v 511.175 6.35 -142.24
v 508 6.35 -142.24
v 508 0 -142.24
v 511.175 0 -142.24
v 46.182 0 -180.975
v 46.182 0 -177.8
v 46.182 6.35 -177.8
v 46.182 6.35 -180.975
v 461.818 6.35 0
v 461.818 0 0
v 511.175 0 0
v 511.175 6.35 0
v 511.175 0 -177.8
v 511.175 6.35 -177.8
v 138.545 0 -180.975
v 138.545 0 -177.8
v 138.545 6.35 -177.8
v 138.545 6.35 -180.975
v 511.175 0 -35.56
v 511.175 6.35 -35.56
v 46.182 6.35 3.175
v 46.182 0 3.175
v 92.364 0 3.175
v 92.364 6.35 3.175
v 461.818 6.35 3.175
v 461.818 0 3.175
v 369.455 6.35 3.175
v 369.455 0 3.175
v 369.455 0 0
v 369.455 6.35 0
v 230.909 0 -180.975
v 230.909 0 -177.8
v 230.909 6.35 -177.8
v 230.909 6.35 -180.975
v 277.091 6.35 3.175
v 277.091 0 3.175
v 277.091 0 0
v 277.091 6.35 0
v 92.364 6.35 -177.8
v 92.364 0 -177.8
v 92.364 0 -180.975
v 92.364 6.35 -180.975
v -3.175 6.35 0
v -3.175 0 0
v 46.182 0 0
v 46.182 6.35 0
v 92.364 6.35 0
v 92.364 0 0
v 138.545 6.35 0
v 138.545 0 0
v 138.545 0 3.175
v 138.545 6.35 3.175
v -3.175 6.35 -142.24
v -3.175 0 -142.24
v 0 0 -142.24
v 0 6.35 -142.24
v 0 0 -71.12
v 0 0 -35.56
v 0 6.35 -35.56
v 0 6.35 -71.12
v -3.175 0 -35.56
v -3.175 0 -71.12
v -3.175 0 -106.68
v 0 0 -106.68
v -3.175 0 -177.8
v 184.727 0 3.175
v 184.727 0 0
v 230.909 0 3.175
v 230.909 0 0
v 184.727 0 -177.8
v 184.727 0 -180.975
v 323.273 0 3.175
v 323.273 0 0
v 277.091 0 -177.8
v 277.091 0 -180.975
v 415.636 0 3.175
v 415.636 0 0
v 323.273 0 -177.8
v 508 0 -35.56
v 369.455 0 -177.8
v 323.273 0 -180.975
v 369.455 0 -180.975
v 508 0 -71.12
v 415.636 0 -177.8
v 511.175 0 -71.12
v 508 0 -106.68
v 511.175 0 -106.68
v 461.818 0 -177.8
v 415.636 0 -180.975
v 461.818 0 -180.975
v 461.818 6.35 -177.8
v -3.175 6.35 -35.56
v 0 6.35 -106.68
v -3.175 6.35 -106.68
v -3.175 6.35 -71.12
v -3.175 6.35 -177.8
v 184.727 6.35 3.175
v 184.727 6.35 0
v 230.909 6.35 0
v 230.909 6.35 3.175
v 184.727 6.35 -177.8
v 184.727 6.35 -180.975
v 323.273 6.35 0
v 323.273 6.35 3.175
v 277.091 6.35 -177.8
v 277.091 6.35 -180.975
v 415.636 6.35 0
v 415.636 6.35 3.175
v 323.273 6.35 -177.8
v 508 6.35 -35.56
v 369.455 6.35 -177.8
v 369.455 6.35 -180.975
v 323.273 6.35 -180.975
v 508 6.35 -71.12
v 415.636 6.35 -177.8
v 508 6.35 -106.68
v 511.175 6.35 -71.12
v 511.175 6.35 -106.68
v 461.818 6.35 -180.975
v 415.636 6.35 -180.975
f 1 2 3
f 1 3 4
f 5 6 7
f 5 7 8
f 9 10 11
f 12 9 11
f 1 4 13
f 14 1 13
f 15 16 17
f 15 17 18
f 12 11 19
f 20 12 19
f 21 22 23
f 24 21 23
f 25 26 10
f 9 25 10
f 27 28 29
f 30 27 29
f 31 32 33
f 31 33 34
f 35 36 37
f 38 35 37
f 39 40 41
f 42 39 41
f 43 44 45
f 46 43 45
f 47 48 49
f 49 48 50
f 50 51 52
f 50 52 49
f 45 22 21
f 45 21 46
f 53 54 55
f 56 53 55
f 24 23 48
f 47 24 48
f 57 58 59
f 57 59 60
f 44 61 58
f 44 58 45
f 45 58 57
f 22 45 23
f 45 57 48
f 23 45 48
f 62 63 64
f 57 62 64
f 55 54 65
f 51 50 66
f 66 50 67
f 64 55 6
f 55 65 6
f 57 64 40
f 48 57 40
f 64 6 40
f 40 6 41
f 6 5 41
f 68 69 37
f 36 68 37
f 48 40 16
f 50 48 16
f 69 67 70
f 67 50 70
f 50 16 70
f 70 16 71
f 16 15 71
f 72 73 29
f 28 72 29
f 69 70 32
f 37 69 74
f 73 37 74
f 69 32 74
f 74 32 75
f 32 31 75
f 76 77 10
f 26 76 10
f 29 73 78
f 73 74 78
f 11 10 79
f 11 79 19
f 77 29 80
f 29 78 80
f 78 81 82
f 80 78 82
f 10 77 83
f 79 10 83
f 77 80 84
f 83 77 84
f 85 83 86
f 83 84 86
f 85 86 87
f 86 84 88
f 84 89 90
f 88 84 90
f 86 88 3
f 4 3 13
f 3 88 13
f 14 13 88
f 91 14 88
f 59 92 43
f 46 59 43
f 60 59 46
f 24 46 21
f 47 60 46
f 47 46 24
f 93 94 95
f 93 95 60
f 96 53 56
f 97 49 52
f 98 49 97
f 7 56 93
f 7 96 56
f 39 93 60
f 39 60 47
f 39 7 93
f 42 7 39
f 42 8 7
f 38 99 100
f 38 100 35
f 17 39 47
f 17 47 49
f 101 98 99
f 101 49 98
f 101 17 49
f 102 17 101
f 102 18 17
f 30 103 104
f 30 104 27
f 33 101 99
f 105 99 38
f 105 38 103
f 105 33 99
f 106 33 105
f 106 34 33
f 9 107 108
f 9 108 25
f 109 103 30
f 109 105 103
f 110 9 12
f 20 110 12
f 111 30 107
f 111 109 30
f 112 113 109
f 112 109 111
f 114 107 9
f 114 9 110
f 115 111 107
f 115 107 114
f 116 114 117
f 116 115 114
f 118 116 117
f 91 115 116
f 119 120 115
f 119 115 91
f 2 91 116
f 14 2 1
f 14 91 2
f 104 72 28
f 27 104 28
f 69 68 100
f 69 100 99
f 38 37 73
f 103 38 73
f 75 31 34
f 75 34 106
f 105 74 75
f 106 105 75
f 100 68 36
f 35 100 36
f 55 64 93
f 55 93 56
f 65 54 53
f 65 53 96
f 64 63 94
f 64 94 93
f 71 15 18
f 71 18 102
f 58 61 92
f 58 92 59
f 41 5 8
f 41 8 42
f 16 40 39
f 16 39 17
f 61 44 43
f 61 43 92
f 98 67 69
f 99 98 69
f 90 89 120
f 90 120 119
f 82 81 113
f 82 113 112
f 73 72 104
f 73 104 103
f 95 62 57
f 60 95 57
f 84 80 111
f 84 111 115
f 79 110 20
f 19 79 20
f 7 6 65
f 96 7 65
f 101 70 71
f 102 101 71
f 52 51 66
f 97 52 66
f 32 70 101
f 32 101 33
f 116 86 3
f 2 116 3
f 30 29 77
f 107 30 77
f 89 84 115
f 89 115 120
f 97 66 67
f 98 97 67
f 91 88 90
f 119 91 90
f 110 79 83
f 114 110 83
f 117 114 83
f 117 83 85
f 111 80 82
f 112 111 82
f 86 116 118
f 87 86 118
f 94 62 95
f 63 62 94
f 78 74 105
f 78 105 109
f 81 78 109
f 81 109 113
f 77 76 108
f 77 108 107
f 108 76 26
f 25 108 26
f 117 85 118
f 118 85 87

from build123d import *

# Parameters (mm, degrees)
SKETCH1_W           = 508
SKETCH1_H           = 177.8
SKETCH1_W_2         = 46.181818182
SKETCH1_H_2         = 3.175
SKETCH1_W_3         = 3.175
SKETCH1_H_3         = 35.56
BOSS_EXTRUDE1_DEPTH = 6.35


with BuildPart() as part:
    # Sketch1 → Boss-Extrude1 (new body)
    with BuildSketch(Plane(origin=(0, 0, 0), x_dir=(1, 0, 0), z_dir=(0, 1, 0))):
        with Locations((254, 88.9)):
            Rectangle(SKETCH1_W, SKETCH1_H)
        with Locations((438.727272727, 179.3875)):
            Rectangle(SKETCH1_W_2, SKETCH1_H_2)
        with Locations((346.363636364, 179.3875)):
            Rectangle(SKETCH1_W_2, SKETCH1_H_2)
        with Locations((254, 179.3875)):
            Rectangle(SKETCH1_W_2, SKETCH1_H_2)
        with Locations((161.636363636, 179.3875)):
            Rectangle(SKETCH1_W_2, SKETCH1_H_2)
        with Locations((69.272727273, 179.3875)):
            Rectangle(SKETCH1_W_2, SKETCH1_H_2)
        with Locations((-1.5875, 160.02)):
            Rectangle(SKETCH1_W_3, SKETCH1_H_3)
        with Locations((-1.5875, 88.9)):
            Rectangle(SKETCH1_W_3, SKETCH1_H_3)
        with Locations((-1.5875, 17.78)):
            Rectangle(SKETCH1_W_3, SKETCH1_H_3)
        with Locations((346.363636364, -1.5875)):
            Rectangle(SKETCH1_W_2, SKETCH1_H_2)
        with Locations((438.727272727, -1.5875)):
            Rectangle(SKETCH1_W_2, SKETCH1_H_2)
        with Locations((509.5875, 17.78)):
            Rectangle(SKETCH1_W_3, SKETCH1_H_3)
        with Locations((509.5875, 88.9)):
            Rectangle(SKETCH1_W_3, SKETCH1_H_3)
        with Locations((509.5875, 160.02)):
            Rectangle(SKETCH1_W_3, SKETCH1_H_3)
        with Locations((69.272727273, -1.5875)):
            Rectangle(SKETCH1_W_2, SKETCH1_H_2)
        with Locations((161.636363636, -1.5875)):
            Rectangle(SKETCH1_W_2, SKETCH1_H_2)
        with Locations((254, -1.5875)):
            Rectangle(SKETCH1_W_2, SKETCH1_H_2)
    extrude(amount=BOSS_EXTRUDE1_DEPTH)


solid = part.part
